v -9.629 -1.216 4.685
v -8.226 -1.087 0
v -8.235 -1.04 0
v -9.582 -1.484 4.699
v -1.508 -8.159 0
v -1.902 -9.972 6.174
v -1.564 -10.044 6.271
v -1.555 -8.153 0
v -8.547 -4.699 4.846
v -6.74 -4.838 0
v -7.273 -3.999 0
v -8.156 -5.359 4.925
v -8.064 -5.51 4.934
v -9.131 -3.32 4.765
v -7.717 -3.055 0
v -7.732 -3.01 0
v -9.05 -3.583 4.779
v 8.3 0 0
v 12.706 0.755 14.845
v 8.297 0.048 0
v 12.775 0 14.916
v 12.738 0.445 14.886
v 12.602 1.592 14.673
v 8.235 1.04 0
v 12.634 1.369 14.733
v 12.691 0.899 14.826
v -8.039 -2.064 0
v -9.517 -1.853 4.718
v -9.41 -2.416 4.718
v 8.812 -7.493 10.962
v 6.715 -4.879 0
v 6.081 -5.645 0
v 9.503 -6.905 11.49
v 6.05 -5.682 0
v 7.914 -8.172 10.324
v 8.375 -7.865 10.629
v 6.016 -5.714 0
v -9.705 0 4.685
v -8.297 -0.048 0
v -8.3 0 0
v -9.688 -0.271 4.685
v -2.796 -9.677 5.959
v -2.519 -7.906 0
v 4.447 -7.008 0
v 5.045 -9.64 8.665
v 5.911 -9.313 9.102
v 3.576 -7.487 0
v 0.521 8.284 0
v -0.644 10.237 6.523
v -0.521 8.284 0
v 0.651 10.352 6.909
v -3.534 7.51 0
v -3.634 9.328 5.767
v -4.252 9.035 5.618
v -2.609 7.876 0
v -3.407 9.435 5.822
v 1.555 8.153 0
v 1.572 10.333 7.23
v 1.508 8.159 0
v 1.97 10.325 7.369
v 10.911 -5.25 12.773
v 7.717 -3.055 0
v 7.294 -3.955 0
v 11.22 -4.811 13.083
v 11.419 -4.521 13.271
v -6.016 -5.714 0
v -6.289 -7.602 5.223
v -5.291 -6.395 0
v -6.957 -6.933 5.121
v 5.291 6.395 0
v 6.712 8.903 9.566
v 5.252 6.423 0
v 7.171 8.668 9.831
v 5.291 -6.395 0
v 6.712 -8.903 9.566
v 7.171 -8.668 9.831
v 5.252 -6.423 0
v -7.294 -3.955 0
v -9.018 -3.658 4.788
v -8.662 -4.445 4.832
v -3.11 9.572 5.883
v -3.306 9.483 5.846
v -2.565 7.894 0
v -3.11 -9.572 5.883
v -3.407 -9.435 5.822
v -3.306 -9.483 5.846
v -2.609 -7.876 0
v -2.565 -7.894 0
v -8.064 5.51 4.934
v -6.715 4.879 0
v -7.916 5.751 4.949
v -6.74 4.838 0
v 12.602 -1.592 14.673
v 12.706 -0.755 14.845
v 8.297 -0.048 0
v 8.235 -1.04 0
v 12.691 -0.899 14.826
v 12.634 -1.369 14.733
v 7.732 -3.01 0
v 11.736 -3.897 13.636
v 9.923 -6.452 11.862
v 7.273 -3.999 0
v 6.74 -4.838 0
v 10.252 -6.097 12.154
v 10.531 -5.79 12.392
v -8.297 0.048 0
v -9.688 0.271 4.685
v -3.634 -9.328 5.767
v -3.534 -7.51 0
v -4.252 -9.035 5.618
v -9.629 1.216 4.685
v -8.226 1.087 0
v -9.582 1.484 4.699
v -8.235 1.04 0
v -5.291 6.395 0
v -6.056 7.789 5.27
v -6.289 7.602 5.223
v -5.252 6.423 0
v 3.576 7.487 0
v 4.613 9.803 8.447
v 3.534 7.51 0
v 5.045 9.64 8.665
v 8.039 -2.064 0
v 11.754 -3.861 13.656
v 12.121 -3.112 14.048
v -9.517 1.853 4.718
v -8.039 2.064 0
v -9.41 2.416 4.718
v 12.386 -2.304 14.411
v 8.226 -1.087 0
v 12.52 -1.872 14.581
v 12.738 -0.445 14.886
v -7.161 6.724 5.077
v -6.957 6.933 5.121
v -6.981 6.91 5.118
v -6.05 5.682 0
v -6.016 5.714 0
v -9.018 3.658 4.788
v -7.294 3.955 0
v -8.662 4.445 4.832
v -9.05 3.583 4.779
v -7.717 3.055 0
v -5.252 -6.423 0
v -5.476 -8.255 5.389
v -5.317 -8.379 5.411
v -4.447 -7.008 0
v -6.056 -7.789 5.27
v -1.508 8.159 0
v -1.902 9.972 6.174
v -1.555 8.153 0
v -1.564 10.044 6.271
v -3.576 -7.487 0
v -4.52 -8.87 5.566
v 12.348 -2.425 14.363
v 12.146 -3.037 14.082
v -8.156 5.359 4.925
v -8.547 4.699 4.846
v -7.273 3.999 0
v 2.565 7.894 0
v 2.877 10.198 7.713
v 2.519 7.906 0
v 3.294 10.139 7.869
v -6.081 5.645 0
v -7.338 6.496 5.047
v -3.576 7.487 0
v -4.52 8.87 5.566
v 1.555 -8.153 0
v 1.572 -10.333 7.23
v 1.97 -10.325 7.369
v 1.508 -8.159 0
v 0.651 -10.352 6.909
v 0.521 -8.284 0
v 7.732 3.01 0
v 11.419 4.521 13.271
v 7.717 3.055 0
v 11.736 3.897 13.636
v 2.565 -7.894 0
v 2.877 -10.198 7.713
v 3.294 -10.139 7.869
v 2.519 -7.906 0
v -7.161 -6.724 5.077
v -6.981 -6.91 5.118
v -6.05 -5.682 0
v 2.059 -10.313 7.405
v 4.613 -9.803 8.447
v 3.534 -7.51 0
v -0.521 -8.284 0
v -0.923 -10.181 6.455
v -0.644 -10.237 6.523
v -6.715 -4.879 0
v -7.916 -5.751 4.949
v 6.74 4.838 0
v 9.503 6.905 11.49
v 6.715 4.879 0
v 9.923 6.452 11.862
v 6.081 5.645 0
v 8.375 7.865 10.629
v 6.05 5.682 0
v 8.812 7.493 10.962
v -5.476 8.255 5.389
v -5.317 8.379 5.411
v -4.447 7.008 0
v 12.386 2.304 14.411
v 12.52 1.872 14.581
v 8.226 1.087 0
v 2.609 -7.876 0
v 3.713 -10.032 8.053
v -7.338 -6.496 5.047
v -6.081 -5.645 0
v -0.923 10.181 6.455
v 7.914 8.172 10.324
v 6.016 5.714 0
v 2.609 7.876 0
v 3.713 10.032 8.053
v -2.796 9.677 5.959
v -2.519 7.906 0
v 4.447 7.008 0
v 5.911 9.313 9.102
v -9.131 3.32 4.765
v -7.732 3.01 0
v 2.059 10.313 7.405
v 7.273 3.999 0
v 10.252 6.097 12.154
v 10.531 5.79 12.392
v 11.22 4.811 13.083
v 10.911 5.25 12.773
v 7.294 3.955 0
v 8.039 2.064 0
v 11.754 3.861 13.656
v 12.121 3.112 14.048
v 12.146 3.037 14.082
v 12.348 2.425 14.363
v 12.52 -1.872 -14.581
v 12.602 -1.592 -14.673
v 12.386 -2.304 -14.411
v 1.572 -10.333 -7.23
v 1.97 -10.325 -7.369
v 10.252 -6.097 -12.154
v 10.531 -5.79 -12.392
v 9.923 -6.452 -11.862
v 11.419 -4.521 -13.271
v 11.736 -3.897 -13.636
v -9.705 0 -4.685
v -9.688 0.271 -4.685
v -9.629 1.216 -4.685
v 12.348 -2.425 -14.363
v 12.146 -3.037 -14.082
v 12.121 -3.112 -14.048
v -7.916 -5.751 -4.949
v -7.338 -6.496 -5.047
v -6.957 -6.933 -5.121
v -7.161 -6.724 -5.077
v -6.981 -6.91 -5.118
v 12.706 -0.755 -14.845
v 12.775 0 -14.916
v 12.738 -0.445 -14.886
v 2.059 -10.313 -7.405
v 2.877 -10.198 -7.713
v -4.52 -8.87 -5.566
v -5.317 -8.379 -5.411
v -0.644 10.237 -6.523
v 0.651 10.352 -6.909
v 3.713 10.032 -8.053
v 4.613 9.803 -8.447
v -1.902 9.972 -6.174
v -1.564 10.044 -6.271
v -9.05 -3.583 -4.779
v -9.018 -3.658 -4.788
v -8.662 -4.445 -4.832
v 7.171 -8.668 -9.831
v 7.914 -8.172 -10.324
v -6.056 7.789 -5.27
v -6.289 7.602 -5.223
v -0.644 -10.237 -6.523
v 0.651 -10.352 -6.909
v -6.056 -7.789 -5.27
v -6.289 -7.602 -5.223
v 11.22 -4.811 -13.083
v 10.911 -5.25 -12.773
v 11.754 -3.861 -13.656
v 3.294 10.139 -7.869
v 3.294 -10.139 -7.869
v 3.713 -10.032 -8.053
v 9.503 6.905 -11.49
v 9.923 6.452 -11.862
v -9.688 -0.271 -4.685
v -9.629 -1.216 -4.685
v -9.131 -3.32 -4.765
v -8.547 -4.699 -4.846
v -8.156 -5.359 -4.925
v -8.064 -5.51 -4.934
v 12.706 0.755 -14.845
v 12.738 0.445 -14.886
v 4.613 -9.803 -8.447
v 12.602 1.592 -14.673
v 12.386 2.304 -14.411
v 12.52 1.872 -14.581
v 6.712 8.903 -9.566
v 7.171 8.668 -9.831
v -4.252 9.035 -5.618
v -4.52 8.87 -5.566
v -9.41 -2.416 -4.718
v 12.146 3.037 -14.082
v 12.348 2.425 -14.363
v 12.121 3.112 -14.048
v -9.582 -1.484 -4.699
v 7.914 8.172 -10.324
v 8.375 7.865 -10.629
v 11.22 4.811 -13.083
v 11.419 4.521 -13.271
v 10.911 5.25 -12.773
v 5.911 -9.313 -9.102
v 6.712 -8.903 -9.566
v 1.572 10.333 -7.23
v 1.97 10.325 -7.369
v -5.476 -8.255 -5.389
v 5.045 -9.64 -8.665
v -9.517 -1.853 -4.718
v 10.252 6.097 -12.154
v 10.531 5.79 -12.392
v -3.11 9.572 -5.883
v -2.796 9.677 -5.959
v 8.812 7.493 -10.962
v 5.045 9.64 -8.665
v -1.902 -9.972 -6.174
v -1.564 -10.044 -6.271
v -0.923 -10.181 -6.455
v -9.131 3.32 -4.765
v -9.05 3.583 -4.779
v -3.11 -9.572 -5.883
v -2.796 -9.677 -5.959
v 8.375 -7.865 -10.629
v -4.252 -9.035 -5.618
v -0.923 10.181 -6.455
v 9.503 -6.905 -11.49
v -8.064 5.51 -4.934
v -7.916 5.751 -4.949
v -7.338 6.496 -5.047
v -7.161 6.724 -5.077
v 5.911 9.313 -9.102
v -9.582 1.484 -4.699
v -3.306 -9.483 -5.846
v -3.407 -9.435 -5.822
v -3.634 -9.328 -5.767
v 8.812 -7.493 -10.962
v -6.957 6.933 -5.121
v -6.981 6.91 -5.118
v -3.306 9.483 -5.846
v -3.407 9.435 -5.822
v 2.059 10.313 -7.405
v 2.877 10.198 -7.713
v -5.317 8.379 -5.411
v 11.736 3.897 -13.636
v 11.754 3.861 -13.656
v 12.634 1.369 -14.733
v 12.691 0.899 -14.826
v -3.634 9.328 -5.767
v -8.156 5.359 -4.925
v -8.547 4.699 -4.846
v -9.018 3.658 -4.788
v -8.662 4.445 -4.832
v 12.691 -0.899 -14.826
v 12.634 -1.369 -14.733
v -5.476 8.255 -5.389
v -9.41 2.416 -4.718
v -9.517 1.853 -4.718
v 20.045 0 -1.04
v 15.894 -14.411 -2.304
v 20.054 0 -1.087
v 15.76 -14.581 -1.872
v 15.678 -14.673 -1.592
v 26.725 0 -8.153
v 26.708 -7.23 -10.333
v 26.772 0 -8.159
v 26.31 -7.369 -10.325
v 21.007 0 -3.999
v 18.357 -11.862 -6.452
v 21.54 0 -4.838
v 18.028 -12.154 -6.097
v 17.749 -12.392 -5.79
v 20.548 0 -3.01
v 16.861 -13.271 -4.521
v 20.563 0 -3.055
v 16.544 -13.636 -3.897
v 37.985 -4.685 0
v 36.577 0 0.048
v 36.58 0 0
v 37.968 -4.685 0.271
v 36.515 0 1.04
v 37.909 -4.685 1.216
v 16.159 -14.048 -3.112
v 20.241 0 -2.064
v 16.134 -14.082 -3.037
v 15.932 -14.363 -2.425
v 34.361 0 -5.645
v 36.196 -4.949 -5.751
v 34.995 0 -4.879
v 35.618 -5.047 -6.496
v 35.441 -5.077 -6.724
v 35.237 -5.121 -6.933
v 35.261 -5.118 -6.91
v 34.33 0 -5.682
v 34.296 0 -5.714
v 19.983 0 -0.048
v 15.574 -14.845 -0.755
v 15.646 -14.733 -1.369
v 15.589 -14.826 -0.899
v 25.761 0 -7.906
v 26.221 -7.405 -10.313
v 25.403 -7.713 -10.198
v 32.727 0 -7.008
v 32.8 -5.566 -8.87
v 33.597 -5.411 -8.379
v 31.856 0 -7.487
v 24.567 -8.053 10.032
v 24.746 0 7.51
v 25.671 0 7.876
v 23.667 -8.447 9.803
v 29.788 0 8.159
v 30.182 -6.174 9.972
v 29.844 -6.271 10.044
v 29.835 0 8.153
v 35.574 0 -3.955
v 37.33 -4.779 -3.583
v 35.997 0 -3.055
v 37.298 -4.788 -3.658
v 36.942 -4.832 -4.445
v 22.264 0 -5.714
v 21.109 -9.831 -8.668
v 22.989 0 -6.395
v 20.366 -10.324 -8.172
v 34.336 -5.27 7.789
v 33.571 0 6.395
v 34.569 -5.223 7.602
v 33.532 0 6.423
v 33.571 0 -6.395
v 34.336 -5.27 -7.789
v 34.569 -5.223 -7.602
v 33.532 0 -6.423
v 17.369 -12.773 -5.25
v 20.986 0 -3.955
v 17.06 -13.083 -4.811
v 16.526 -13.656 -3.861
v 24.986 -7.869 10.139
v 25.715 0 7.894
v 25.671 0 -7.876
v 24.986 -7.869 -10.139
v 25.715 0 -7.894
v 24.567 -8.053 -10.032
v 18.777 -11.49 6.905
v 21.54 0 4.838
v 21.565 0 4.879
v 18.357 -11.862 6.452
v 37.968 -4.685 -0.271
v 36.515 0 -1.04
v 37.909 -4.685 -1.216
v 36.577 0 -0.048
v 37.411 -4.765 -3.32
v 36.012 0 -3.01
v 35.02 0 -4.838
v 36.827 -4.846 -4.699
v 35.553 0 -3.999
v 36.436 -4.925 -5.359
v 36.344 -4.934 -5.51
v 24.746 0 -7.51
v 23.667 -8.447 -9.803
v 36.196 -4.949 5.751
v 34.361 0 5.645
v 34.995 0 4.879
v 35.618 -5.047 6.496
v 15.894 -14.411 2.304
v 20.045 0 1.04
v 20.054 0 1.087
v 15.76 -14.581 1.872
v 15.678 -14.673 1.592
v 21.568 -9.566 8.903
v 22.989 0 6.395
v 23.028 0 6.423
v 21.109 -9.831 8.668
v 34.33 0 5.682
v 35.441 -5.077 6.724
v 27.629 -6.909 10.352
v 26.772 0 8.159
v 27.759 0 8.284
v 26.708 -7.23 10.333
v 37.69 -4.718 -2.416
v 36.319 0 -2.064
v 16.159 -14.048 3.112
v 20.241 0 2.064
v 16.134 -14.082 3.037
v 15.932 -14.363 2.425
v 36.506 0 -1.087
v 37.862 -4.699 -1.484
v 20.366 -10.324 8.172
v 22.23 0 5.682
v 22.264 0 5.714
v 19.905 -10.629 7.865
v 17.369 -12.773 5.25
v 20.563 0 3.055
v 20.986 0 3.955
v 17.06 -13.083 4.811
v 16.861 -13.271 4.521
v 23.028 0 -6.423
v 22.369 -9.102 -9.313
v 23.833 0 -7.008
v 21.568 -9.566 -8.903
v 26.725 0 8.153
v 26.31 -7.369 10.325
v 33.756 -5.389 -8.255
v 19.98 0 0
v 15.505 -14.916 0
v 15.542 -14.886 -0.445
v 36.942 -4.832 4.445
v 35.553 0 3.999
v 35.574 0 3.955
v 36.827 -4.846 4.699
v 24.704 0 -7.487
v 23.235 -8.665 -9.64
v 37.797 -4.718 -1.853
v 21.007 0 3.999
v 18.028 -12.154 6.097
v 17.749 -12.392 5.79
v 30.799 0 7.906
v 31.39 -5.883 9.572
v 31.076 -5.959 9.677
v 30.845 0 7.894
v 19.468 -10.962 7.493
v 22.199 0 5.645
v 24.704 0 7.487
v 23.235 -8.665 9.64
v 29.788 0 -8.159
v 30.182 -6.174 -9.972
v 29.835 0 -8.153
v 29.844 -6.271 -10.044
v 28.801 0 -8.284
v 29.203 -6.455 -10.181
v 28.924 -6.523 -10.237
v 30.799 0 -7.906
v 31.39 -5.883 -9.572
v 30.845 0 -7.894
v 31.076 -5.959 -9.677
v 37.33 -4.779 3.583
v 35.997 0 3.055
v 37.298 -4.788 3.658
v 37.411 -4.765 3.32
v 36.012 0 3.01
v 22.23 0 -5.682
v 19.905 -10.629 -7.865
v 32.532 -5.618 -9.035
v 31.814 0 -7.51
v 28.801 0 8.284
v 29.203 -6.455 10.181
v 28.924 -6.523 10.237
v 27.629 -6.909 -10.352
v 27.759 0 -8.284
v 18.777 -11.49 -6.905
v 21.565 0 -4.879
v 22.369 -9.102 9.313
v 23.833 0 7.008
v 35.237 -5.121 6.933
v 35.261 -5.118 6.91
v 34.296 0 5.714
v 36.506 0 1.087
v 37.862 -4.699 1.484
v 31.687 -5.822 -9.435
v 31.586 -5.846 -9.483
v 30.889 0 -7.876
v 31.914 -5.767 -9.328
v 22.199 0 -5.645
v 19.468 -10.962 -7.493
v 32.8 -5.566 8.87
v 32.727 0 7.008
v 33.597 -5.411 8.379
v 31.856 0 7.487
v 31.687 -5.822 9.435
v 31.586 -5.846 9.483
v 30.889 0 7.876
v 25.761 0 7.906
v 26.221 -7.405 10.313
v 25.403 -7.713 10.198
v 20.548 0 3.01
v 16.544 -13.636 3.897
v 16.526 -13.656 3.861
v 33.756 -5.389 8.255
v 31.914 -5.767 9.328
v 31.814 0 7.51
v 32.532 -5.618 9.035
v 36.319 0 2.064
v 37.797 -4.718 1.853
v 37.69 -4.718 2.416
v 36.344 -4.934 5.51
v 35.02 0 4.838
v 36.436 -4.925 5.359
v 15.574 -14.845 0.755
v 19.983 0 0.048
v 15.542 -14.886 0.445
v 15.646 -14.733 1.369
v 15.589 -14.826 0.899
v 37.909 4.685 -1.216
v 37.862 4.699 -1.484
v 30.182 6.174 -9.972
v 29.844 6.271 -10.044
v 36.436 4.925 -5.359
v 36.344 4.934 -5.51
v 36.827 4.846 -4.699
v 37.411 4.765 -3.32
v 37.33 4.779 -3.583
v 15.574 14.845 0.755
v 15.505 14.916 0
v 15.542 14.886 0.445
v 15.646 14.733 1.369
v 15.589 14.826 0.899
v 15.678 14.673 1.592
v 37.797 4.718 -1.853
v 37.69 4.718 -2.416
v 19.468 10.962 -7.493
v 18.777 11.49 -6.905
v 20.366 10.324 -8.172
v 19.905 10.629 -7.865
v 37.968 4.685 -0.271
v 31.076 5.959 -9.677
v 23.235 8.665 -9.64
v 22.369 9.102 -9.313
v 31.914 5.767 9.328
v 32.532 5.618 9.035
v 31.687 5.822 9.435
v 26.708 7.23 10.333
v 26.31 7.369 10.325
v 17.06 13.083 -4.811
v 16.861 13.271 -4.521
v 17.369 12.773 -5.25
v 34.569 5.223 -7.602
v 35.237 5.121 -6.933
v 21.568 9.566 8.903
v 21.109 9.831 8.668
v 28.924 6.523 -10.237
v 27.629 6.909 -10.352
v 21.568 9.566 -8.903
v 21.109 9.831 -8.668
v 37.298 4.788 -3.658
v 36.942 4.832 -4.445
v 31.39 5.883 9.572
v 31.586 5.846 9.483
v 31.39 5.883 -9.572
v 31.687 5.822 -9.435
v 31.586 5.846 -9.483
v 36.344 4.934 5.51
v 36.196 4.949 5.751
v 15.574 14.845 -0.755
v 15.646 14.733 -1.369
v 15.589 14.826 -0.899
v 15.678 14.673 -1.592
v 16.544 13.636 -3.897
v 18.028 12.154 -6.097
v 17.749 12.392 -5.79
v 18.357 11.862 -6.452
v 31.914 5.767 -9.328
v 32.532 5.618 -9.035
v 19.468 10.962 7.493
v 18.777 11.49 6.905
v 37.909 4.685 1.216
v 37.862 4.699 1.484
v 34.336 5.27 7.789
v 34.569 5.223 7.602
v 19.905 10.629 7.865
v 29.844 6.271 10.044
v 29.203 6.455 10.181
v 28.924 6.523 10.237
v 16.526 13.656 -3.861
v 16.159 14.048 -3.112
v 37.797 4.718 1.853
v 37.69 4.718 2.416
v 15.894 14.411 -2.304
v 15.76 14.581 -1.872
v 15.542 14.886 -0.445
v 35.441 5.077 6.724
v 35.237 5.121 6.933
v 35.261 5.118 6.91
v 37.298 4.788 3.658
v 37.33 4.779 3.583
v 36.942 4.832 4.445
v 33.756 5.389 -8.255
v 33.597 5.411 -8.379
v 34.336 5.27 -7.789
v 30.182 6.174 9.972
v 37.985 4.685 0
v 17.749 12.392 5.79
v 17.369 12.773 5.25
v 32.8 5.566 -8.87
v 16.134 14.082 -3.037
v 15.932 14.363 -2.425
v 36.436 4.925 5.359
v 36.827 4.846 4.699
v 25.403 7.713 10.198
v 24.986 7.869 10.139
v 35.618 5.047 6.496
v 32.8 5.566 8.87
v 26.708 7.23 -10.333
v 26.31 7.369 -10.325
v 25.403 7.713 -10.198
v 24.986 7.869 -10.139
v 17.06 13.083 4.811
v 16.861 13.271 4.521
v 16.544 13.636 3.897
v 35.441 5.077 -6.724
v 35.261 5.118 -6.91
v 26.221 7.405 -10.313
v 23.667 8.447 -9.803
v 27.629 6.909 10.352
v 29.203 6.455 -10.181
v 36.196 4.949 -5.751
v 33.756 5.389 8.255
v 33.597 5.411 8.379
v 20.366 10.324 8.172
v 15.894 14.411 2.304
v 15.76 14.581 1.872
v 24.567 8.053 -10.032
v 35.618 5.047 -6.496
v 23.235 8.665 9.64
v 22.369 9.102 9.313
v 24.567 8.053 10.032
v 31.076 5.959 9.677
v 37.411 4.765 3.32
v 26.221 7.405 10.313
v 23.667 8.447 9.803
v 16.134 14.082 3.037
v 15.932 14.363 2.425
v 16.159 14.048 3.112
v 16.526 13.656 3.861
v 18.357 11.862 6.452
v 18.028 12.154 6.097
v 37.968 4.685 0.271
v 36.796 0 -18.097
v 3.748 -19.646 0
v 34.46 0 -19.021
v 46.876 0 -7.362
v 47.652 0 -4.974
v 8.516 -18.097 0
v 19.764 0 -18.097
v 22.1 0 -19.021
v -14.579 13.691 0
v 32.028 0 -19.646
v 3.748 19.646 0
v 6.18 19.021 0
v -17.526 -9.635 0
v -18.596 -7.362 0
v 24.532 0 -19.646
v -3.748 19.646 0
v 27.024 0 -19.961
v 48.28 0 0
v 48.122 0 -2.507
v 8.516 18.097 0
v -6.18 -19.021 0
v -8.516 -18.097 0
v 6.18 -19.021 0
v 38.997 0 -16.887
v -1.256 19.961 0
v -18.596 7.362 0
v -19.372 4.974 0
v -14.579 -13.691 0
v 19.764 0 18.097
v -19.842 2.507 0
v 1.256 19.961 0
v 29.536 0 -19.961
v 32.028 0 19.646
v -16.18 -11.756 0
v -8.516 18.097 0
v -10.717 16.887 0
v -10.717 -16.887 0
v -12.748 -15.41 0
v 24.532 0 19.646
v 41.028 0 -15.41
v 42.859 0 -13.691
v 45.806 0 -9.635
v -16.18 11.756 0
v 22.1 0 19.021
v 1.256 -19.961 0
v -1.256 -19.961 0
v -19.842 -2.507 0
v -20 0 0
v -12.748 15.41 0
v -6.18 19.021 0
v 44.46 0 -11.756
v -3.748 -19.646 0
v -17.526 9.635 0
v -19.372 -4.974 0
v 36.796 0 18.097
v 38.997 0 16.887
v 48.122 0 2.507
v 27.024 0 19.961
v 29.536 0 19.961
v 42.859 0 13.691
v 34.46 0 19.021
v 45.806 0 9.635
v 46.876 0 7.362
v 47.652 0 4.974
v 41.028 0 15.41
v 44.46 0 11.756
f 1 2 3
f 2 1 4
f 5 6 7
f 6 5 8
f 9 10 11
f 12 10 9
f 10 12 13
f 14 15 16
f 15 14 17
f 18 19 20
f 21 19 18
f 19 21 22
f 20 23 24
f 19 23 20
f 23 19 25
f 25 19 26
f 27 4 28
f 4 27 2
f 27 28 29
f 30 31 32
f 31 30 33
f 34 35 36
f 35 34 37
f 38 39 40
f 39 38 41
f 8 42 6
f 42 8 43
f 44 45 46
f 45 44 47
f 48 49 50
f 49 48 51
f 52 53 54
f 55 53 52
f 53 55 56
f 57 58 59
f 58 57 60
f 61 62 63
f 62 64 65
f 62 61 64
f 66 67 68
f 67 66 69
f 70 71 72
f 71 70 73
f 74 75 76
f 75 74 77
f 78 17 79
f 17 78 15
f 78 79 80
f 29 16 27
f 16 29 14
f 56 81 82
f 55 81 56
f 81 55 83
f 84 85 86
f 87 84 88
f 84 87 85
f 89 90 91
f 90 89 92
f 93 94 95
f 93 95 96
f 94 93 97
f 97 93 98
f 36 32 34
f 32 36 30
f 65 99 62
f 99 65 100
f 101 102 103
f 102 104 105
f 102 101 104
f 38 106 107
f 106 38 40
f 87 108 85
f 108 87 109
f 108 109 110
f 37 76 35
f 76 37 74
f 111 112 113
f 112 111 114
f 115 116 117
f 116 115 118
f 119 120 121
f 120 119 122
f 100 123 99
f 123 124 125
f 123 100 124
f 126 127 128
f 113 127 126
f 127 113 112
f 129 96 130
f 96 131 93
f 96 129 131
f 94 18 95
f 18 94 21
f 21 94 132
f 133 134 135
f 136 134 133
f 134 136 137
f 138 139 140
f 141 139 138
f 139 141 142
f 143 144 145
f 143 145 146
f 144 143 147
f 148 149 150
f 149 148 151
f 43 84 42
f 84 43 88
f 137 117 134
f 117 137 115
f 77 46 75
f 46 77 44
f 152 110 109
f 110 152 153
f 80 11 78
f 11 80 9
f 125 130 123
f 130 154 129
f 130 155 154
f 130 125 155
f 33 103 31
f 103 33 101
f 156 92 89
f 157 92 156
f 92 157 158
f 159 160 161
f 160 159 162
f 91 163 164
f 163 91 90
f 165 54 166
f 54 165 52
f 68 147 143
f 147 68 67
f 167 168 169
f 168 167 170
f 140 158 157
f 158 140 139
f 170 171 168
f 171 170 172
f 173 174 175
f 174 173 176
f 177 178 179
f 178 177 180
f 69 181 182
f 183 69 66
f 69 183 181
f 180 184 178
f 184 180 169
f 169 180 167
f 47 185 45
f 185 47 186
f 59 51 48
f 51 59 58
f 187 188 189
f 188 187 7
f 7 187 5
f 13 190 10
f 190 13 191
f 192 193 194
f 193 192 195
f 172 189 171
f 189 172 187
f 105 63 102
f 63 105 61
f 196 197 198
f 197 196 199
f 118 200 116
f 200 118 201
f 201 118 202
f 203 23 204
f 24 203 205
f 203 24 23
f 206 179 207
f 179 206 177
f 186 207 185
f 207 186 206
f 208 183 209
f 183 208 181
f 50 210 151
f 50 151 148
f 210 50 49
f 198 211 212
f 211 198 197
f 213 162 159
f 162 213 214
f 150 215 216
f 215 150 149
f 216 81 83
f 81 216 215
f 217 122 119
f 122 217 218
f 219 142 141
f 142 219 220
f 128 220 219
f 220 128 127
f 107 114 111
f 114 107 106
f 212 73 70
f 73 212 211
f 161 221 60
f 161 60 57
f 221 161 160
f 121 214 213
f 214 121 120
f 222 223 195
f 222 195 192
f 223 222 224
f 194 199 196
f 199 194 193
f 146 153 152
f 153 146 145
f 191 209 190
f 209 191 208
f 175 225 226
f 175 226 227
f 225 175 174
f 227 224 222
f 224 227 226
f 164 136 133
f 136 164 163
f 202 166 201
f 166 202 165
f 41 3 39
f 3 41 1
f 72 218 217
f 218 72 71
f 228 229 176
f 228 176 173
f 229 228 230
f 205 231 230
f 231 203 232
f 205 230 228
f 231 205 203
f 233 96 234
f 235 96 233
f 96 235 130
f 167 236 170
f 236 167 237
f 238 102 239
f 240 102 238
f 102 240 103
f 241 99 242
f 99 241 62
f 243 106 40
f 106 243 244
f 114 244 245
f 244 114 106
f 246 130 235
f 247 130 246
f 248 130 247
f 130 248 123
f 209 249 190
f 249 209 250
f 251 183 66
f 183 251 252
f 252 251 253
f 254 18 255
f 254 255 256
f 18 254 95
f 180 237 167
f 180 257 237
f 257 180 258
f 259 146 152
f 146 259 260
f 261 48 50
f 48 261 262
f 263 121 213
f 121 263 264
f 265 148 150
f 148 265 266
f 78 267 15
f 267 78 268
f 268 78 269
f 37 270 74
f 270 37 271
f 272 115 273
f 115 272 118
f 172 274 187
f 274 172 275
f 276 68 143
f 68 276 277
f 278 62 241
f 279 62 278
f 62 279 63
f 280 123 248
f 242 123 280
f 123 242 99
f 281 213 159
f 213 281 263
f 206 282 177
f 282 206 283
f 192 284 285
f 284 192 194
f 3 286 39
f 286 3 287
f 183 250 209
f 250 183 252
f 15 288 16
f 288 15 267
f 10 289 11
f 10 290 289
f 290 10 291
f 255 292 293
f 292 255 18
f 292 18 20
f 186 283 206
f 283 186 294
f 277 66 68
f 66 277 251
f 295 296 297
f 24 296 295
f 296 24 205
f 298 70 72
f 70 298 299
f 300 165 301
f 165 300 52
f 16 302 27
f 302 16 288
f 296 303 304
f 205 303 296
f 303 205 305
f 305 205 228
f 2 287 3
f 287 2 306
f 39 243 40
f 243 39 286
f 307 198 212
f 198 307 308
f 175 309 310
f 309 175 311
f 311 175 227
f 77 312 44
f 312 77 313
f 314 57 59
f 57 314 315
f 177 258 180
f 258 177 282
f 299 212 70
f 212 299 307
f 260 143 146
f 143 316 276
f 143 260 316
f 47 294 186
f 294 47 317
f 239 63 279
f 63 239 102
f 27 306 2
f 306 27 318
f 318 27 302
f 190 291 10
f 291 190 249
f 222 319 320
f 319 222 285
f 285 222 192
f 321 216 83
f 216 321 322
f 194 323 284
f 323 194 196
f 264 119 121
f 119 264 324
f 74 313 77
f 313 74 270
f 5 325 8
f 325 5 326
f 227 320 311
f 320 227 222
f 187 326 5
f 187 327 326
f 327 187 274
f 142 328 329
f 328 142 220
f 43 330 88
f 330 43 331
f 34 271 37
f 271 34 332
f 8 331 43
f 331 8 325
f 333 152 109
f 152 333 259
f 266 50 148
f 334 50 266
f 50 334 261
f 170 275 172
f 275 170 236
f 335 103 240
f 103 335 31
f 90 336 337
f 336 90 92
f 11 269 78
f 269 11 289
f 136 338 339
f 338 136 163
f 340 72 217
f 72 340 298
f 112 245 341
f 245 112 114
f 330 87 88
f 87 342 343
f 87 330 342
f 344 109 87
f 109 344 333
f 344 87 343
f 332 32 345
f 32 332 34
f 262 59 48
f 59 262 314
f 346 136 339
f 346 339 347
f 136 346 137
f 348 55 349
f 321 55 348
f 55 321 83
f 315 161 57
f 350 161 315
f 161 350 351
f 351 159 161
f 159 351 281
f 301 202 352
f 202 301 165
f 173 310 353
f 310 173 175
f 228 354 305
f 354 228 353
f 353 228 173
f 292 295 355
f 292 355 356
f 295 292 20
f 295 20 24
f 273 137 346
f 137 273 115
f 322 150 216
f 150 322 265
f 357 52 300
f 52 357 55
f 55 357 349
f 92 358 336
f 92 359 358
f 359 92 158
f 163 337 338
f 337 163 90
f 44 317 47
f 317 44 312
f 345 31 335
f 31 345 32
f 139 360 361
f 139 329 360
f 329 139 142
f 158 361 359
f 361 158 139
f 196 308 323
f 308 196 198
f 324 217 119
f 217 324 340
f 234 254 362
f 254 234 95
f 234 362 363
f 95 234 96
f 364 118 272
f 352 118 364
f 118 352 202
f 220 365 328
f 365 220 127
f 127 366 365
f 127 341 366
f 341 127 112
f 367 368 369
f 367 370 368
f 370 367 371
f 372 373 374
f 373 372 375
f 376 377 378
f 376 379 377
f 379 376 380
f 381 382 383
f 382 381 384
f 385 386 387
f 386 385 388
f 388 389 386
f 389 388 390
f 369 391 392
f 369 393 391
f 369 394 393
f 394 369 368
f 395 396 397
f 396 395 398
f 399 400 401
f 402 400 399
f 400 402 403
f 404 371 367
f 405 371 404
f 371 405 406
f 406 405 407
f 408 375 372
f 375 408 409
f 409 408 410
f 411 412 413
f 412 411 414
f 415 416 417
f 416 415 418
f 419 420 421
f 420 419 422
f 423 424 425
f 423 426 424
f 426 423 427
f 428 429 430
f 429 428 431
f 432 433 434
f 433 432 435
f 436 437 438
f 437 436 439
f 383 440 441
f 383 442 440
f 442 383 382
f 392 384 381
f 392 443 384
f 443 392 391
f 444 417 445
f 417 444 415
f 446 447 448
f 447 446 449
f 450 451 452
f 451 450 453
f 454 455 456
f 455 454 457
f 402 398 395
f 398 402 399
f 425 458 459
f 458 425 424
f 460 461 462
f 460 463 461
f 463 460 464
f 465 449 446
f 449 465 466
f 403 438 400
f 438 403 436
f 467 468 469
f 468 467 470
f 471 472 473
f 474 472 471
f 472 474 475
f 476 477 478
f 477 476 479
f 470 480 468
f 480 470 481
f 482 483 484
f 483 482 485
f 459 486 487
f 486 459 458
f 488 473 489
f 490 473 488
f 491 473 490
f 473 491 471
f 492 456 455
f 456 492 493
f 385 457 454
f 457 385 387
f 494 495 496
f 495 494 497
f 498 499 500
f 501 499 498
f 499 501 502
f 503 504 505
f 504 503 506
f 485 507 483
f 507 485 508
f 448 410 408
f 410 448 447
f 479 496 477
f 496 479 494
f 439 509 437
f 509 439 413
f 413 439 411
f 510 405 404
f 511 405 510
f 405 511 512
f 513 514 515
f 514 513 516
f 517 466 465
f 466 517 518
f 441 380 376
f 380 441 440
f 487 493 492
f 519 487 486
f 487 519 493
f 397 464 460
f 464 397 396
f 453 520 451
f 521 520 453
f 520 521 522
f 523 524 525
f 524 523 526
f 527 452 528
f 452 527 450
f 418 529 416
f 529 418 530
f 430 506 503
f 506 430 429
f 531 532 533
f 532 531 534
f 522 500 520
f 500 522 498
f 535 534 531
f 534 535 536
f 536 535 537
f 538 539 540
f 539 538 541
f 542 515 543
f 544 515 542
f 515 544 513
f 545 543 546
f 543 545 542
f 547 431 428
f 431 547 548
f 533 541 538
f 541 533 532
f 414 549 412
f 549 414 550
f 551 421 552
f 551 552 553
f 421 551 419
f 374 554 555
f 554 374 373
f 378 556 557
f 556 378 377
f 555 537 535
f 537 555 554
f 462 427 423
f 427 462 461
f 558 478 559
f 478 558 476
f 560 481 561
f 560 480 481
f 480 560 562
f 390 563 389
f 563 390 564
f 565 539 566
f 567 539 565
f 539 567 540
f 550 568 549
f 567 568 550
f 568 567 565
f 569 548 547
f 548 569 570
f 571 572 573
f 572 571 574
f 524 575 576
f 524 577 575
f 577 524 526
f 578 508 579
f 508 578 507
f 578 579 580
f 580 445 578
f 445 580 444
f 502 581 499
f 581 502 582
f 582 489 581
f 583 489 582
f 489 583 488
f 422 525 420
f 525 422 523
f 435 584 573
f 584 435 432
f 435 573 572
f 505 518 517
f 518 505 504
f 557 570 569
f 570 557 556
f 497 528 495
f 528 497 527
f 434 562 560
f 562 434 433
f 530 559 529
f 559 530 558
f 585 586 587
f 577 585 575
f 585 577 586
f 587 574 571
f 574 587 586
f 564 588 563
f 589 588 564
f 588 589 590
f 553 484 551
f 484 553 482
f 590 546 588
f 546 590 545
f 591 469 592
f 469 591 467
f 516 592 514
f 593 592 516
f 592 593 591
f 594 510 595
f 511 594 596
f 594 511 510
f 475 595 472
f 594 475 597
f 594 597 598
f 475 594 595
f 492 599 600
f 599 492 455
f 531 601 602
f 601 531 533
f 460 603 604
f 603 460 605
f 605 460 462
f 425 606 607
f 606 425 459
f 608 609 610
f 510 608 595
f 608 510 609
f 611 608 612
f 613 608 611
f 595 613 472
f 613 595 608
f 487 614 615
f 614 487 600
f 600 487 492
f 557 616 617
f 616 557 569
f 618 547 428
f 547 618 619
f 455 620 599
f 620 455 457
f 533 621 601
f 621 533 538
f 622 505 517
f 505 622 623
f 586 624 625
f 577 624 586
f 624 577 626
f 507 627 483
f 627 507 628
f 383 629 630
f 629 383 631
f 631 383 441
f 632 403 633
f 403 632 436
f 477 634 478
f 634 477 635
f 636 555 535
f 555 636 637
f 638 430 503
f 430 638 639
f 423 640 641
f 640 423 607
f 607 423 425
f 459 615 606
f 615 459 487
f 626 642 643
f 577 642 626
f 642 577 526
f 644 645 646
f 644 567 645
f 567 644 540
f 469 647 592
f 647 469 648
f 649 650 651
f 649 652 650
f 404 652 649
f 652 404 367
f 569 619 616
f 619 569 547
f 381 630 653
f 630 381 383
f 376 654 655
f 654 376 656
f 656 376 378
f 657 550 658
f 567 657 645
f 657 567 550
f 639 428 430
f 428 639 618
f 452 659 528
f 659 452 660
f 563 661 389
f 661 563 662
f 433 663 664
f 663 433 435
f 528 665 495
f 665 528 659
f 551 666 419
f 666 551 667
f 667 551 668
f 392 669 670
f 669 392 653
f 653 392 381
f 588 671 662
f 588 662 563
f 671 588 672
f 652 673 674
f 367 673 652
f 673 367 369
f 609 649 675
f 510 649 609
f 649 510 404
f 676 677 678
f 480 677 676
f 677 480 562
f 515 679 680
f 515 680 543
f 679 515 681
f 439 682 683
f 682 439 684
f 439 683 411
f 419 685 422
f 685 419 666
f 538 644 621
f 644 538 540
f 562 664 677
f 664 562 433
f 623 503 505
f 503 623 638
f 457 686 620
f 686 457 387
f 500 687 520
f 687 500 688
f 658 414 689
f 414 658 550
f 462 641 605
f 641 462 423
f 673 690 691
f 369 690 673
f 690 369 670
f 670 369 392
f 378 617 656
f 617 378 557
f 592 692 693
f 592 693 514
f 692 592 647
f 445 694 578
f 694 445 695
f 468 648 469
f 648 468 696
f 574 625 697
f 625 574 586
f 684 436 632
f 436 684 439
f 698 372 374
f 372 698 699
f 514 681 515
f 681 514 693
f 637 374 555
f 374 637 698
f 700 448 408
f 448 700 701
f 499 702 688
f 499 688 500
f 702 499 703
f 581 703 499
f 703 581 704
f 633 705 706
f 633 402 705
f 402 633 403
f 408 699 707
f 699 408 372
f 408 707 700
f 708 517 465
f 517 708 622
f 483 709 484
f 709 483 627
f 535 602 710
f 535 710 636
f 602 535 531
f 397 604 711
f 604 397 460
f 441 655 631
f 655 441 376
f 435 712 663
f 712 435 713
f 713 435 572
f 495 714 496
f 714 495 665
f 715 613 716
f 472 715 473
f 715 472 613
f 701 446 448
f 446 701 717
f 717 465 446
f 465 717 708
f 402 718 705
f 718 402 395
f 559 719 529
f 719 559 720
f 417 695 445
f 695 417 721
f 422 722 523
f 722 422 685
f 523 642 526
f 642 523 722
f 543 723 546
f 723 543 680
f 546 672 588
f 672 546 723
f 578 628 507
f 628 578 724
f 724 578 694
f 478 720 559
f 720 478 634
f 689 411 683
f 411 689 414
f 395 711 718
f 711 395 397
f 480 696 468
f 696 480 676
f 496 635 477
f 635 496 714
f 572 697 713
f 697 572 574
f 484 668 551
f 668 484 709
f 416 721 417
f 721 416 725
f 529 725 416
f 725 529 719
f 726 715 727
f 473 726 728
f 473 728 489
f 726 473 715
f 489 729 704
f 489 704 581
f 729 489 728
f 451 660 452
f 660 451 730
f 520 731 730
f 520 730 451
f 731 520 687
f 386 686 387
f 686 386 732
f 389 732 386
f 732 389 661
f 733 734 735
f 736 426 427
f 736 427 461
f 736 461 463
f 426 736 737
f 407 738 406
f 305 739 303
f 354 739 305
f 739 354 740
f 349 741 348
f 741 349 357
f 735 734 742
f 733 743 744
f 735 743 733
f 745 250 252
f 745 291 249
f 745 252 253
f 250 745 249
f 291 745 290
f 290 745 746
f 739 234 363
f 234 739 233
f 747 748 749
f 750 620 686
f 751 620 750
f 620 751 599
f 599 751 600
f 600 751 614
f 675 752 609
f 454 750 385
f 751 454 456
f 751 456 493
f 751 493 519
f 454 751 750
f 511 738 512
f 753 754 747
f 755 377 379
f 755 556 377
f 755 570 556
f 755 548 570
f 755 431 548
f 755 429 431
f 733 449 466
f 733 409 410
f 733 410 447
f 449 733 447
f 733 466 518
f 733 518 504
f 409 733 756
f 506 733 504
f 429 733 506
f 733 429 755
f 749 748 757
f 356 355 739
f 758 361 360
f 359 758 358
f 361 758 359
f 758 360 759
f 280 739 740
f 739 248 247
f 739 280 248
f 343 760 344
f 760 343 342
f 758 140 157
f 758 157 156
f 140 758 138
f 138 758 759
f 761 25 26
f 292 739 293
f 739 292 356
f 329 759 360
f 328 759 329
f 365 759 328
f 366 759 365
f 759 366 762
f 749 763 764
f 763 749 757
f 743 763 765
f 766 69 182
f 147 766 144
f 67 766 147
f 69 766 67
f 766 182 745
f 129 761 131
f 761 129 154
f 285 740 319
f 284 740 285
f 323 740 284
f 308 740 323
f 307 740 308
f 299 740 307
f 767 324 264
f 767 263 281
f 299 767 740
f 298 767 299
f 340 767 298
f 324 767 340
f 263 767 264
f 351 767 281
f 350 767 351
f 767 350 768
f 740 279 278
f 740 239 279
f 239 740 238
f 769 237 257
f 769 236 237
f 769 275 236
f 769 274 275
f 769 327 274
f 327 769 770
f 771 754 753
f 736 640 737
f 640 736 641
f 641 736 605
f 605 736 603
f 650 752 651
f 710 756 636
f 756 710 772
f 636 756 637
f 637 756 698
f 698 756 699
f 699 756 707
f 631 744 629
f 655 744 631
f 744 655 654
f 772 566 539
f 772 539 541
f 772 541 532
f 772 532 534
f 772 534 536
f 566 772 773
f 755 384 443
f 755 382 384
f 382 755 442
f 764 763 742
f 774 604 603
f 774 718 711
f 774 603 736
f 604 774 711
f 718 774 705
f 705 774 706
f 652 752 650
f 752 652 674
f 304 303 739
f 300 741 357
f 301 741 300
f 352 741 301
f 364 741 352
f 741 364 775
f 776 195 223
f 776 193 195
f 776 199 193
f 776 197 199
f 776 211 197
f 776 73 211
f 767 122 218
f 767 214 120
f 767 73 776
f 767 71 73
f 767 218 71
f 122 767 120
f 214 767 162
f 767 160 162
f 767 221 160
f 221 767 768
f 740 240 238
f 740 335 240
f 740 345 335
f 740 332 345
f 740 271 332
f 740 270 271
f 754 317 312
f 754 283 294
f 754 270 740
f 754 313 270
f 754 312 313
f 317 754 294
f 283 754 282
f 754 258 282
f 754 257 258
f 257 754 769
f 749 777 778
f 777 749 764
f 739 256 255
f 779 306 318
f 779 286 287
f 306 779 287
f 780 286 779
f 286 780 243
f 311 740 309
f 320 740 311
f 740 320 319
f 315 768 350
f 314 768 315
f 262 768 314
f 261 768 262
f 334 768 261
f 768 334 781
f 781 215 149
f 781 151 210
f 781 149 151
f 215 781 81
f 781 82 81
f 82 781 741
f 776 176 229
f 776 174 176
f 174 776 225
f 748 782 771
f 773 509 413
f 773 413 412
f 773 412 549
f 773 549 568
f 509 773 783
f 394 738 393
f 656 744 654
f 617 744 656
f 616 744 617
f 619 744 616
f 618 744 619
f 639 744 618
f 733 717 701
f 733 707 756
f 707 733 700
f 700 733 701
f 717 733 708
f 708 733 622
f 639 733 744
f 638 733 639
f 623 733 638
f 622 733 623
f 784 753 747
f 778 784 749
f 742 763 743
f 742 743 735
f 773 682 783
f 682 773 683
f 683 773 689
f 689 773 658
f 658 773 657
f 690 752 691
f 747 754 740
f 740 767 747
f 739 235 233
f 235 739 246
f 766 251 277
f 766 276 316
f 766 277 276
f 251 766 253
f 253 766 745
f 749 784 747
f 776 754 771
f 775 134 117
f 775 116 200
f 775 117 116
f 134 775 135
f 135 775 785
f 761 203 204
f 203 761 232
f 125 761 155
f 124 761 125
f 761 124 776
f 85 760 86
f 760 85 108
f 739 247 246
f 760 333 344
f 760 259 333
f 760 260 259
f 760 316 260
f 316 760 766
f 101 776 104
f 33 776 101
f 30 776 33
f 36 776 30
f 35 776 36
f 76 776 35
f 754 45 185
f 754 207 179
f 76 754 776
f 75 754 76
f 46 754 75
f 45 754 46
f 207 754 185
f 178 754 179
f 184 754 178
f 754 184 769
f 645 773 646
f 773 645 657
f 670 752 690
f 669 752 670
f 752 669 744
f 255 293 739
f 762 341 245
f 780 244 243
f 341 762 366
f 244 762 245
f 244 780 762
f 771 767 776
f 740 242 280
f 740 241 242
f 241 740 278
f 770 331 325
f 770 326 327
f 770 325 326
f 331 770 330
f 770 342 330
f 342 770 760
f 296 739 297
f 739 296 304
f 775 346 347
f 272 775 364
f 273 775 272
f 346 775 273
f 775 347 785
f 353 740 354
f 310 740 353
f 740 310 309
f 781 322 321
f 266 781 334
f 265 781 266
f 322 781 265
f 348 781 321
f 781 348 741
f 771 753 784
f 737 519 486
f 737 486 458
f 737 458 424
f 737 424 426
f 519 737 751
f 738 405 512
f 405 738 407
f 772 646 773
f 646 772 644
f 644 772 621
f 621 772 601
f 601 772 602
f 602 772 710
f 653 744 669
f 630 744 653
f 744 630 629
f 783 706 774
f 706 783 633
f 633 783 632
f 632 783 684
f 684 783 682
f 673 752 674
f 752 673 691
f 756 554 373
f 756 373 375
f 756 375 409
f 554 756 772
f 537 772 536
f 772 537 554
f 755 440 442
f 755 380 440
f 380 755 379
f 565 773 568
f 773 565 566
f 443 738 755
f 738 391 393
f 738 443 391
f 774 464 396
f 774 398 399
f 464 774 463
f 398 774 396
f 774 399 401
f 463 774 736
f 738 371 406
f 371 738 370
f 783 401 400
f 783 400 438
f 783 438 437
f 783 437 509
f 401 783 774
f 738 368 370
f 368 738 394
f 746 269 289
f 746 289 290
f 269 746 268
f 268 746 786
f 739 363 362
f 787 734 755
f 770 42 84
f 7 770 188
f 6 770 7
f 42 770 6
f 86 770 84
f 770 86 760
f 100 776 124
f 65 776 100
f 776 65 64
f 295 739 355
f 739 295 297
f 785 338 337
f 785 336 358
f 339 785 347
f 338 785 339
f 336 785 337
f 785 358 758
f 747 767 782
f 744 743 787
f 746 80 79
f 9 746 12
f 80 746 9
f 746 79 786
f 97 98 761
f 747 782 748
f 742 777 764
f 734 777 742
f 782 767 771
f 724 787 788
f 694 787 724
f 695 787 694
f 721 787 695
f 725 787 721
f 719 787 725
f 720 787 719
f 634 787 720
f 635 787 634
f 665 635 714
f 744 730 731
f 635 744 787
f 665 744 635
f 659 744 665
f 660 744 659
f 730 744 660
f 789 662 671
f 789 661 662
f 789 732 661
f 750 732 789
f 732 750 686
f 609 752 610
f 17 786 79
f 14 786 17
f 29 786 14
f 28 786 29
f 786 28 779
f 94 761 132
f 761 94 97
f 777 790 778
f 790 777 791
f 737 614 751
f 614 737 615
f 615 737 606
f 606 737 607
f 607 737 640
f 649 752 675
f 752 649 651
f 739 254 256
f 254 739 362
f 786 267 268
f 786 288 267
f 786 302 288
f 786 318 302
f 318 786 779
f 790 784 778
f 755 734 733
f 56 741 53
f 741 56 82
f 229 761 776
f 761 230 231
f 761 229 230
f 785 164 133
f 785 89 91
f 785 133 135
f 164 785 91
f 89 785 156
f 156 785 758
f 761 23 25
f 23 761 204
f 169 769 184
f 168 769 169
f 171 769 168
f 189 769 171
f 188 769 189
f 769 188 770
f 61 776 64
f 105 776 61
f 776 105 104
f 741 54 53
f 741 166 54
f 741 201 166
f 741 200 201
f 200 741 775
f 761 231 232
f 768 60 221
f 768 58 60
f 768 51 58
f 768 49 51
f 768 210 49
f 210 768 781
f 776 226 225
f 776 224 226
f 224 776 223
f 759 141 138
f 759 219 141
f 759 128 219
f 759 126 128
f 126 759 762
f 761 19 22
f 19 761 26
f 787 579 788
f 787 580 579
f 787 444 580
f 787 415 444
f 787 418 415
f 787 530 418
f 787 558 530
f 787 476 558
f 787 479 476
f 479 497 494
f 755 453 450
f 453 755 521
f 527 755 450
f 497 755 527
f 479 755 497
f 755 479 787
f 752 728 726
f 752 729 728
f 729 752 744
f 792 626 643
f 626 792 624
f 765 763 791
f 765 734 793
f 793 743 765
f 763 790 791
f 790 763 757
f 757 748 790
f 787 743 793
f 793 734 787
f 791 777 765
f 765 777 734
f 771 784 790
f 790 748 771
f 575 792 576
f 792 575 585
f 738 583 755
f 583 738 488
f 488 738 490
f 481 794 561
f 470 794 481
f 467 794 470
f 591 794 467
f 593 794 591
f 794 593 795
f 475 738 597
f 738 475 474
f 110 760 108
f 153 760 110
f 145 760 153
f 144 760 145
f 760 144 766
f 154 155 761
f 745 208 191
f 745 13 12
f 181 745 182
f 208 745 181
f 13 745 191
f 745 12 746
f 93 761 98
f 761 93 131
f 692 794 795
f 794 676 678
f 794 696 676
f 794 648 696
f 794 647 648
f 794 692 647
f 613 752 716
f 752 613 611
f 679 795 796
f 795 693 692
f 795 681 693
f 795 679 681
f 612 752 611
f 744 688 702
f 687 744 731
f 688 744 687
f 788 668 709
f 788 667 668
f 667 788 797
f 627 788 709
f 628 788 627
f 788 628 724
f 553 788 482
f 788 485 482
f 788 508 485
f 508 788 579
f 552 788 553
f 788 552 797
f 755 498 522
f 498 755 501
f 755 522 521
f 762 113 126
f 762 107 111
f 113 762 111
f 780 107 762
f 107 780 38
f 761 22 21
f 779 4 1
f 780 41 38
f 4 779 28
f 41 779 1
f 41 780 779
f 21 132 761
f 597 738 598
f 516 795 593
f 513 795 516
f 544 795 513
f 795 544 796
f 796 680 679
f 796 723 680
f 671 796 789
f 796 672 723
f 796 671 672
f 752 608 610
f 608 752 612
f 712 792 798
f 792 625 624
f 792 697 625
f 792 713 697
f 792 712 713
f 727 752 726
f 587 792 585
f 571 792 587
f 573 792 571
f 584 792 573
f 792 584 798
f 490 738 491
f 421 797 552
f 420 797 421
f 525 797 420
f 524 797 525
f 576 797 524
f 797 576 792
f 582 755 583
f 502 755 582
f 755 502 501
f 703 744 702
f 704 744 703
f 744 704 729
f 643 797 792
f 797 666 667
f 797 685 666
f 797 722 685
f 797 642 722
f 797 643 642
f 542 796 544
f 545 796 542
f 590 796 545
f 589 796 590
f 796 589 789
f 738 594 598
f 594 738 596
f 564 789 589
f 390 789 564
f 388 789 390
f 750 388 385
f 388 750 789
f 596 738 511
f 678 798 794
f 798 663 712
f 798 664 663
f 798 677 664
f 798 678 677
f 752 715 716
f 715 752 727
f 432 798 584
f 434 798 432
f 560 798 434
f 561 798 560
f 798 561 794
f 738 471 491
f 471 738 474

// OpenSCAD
// half or full oloid
form = "full";  // [half, full ]
// radius of one circle
radius=20;
// radius of hole - 0 for solid
hole_radius=8; 
// % slope of hole
hole_slope= 30; 
// offset ratio - 1 for true oloid, 1.414 (sqrt(2)for 2 circle roller
offset_ratio =  1.414;



module d(r) {
  cylinder(r1=r,r2=0,h=eps);
}

module disk(r){
  d(r);rotate([0,180,0]) d(r);
}

module hole(r,slope) {
   translate([0,0,-1]) cylinder(r1=r,r2=r+slope,h=100);
   rotate([0,180,0])
      translate([0,0,-1]) cylinder(r1=r,r2=r+slope,h=100);
};

module oloid(radius,offset_ratio,hole_radius,hole_slope){
  difference() {
     hull(){
      disk(radius);
      rotate([90,00,0]) translate([radius*offset_ratio,0,0]) 
         disk(radius);
     }
     hole(hole_radius,hole_slope);
     rotate([90,00,0]) translate([radius*offset_ratio,0,0])
        hole(hole_radius,hole_slope);
 }
}
module ground() {
   translate([0,0,-100]) cube([200,200,200], center=true);

}

module ruler(n) {
   for (i=[0:n-1]) 
       translate([(i-n/2 +0.5)* 10,0,0]) cube([9.8,5,2], center=true);
}

eps=0.1;
$fn=50;

if (form =="half") 
     difference() {
       oloid(radius,offset_ratio,hole_radius,hole_slope);
       ground();
    }
else   
     oloid(radius,offset_ratio,hole_radius,hole_slope);
 
 

*ruler(10);
